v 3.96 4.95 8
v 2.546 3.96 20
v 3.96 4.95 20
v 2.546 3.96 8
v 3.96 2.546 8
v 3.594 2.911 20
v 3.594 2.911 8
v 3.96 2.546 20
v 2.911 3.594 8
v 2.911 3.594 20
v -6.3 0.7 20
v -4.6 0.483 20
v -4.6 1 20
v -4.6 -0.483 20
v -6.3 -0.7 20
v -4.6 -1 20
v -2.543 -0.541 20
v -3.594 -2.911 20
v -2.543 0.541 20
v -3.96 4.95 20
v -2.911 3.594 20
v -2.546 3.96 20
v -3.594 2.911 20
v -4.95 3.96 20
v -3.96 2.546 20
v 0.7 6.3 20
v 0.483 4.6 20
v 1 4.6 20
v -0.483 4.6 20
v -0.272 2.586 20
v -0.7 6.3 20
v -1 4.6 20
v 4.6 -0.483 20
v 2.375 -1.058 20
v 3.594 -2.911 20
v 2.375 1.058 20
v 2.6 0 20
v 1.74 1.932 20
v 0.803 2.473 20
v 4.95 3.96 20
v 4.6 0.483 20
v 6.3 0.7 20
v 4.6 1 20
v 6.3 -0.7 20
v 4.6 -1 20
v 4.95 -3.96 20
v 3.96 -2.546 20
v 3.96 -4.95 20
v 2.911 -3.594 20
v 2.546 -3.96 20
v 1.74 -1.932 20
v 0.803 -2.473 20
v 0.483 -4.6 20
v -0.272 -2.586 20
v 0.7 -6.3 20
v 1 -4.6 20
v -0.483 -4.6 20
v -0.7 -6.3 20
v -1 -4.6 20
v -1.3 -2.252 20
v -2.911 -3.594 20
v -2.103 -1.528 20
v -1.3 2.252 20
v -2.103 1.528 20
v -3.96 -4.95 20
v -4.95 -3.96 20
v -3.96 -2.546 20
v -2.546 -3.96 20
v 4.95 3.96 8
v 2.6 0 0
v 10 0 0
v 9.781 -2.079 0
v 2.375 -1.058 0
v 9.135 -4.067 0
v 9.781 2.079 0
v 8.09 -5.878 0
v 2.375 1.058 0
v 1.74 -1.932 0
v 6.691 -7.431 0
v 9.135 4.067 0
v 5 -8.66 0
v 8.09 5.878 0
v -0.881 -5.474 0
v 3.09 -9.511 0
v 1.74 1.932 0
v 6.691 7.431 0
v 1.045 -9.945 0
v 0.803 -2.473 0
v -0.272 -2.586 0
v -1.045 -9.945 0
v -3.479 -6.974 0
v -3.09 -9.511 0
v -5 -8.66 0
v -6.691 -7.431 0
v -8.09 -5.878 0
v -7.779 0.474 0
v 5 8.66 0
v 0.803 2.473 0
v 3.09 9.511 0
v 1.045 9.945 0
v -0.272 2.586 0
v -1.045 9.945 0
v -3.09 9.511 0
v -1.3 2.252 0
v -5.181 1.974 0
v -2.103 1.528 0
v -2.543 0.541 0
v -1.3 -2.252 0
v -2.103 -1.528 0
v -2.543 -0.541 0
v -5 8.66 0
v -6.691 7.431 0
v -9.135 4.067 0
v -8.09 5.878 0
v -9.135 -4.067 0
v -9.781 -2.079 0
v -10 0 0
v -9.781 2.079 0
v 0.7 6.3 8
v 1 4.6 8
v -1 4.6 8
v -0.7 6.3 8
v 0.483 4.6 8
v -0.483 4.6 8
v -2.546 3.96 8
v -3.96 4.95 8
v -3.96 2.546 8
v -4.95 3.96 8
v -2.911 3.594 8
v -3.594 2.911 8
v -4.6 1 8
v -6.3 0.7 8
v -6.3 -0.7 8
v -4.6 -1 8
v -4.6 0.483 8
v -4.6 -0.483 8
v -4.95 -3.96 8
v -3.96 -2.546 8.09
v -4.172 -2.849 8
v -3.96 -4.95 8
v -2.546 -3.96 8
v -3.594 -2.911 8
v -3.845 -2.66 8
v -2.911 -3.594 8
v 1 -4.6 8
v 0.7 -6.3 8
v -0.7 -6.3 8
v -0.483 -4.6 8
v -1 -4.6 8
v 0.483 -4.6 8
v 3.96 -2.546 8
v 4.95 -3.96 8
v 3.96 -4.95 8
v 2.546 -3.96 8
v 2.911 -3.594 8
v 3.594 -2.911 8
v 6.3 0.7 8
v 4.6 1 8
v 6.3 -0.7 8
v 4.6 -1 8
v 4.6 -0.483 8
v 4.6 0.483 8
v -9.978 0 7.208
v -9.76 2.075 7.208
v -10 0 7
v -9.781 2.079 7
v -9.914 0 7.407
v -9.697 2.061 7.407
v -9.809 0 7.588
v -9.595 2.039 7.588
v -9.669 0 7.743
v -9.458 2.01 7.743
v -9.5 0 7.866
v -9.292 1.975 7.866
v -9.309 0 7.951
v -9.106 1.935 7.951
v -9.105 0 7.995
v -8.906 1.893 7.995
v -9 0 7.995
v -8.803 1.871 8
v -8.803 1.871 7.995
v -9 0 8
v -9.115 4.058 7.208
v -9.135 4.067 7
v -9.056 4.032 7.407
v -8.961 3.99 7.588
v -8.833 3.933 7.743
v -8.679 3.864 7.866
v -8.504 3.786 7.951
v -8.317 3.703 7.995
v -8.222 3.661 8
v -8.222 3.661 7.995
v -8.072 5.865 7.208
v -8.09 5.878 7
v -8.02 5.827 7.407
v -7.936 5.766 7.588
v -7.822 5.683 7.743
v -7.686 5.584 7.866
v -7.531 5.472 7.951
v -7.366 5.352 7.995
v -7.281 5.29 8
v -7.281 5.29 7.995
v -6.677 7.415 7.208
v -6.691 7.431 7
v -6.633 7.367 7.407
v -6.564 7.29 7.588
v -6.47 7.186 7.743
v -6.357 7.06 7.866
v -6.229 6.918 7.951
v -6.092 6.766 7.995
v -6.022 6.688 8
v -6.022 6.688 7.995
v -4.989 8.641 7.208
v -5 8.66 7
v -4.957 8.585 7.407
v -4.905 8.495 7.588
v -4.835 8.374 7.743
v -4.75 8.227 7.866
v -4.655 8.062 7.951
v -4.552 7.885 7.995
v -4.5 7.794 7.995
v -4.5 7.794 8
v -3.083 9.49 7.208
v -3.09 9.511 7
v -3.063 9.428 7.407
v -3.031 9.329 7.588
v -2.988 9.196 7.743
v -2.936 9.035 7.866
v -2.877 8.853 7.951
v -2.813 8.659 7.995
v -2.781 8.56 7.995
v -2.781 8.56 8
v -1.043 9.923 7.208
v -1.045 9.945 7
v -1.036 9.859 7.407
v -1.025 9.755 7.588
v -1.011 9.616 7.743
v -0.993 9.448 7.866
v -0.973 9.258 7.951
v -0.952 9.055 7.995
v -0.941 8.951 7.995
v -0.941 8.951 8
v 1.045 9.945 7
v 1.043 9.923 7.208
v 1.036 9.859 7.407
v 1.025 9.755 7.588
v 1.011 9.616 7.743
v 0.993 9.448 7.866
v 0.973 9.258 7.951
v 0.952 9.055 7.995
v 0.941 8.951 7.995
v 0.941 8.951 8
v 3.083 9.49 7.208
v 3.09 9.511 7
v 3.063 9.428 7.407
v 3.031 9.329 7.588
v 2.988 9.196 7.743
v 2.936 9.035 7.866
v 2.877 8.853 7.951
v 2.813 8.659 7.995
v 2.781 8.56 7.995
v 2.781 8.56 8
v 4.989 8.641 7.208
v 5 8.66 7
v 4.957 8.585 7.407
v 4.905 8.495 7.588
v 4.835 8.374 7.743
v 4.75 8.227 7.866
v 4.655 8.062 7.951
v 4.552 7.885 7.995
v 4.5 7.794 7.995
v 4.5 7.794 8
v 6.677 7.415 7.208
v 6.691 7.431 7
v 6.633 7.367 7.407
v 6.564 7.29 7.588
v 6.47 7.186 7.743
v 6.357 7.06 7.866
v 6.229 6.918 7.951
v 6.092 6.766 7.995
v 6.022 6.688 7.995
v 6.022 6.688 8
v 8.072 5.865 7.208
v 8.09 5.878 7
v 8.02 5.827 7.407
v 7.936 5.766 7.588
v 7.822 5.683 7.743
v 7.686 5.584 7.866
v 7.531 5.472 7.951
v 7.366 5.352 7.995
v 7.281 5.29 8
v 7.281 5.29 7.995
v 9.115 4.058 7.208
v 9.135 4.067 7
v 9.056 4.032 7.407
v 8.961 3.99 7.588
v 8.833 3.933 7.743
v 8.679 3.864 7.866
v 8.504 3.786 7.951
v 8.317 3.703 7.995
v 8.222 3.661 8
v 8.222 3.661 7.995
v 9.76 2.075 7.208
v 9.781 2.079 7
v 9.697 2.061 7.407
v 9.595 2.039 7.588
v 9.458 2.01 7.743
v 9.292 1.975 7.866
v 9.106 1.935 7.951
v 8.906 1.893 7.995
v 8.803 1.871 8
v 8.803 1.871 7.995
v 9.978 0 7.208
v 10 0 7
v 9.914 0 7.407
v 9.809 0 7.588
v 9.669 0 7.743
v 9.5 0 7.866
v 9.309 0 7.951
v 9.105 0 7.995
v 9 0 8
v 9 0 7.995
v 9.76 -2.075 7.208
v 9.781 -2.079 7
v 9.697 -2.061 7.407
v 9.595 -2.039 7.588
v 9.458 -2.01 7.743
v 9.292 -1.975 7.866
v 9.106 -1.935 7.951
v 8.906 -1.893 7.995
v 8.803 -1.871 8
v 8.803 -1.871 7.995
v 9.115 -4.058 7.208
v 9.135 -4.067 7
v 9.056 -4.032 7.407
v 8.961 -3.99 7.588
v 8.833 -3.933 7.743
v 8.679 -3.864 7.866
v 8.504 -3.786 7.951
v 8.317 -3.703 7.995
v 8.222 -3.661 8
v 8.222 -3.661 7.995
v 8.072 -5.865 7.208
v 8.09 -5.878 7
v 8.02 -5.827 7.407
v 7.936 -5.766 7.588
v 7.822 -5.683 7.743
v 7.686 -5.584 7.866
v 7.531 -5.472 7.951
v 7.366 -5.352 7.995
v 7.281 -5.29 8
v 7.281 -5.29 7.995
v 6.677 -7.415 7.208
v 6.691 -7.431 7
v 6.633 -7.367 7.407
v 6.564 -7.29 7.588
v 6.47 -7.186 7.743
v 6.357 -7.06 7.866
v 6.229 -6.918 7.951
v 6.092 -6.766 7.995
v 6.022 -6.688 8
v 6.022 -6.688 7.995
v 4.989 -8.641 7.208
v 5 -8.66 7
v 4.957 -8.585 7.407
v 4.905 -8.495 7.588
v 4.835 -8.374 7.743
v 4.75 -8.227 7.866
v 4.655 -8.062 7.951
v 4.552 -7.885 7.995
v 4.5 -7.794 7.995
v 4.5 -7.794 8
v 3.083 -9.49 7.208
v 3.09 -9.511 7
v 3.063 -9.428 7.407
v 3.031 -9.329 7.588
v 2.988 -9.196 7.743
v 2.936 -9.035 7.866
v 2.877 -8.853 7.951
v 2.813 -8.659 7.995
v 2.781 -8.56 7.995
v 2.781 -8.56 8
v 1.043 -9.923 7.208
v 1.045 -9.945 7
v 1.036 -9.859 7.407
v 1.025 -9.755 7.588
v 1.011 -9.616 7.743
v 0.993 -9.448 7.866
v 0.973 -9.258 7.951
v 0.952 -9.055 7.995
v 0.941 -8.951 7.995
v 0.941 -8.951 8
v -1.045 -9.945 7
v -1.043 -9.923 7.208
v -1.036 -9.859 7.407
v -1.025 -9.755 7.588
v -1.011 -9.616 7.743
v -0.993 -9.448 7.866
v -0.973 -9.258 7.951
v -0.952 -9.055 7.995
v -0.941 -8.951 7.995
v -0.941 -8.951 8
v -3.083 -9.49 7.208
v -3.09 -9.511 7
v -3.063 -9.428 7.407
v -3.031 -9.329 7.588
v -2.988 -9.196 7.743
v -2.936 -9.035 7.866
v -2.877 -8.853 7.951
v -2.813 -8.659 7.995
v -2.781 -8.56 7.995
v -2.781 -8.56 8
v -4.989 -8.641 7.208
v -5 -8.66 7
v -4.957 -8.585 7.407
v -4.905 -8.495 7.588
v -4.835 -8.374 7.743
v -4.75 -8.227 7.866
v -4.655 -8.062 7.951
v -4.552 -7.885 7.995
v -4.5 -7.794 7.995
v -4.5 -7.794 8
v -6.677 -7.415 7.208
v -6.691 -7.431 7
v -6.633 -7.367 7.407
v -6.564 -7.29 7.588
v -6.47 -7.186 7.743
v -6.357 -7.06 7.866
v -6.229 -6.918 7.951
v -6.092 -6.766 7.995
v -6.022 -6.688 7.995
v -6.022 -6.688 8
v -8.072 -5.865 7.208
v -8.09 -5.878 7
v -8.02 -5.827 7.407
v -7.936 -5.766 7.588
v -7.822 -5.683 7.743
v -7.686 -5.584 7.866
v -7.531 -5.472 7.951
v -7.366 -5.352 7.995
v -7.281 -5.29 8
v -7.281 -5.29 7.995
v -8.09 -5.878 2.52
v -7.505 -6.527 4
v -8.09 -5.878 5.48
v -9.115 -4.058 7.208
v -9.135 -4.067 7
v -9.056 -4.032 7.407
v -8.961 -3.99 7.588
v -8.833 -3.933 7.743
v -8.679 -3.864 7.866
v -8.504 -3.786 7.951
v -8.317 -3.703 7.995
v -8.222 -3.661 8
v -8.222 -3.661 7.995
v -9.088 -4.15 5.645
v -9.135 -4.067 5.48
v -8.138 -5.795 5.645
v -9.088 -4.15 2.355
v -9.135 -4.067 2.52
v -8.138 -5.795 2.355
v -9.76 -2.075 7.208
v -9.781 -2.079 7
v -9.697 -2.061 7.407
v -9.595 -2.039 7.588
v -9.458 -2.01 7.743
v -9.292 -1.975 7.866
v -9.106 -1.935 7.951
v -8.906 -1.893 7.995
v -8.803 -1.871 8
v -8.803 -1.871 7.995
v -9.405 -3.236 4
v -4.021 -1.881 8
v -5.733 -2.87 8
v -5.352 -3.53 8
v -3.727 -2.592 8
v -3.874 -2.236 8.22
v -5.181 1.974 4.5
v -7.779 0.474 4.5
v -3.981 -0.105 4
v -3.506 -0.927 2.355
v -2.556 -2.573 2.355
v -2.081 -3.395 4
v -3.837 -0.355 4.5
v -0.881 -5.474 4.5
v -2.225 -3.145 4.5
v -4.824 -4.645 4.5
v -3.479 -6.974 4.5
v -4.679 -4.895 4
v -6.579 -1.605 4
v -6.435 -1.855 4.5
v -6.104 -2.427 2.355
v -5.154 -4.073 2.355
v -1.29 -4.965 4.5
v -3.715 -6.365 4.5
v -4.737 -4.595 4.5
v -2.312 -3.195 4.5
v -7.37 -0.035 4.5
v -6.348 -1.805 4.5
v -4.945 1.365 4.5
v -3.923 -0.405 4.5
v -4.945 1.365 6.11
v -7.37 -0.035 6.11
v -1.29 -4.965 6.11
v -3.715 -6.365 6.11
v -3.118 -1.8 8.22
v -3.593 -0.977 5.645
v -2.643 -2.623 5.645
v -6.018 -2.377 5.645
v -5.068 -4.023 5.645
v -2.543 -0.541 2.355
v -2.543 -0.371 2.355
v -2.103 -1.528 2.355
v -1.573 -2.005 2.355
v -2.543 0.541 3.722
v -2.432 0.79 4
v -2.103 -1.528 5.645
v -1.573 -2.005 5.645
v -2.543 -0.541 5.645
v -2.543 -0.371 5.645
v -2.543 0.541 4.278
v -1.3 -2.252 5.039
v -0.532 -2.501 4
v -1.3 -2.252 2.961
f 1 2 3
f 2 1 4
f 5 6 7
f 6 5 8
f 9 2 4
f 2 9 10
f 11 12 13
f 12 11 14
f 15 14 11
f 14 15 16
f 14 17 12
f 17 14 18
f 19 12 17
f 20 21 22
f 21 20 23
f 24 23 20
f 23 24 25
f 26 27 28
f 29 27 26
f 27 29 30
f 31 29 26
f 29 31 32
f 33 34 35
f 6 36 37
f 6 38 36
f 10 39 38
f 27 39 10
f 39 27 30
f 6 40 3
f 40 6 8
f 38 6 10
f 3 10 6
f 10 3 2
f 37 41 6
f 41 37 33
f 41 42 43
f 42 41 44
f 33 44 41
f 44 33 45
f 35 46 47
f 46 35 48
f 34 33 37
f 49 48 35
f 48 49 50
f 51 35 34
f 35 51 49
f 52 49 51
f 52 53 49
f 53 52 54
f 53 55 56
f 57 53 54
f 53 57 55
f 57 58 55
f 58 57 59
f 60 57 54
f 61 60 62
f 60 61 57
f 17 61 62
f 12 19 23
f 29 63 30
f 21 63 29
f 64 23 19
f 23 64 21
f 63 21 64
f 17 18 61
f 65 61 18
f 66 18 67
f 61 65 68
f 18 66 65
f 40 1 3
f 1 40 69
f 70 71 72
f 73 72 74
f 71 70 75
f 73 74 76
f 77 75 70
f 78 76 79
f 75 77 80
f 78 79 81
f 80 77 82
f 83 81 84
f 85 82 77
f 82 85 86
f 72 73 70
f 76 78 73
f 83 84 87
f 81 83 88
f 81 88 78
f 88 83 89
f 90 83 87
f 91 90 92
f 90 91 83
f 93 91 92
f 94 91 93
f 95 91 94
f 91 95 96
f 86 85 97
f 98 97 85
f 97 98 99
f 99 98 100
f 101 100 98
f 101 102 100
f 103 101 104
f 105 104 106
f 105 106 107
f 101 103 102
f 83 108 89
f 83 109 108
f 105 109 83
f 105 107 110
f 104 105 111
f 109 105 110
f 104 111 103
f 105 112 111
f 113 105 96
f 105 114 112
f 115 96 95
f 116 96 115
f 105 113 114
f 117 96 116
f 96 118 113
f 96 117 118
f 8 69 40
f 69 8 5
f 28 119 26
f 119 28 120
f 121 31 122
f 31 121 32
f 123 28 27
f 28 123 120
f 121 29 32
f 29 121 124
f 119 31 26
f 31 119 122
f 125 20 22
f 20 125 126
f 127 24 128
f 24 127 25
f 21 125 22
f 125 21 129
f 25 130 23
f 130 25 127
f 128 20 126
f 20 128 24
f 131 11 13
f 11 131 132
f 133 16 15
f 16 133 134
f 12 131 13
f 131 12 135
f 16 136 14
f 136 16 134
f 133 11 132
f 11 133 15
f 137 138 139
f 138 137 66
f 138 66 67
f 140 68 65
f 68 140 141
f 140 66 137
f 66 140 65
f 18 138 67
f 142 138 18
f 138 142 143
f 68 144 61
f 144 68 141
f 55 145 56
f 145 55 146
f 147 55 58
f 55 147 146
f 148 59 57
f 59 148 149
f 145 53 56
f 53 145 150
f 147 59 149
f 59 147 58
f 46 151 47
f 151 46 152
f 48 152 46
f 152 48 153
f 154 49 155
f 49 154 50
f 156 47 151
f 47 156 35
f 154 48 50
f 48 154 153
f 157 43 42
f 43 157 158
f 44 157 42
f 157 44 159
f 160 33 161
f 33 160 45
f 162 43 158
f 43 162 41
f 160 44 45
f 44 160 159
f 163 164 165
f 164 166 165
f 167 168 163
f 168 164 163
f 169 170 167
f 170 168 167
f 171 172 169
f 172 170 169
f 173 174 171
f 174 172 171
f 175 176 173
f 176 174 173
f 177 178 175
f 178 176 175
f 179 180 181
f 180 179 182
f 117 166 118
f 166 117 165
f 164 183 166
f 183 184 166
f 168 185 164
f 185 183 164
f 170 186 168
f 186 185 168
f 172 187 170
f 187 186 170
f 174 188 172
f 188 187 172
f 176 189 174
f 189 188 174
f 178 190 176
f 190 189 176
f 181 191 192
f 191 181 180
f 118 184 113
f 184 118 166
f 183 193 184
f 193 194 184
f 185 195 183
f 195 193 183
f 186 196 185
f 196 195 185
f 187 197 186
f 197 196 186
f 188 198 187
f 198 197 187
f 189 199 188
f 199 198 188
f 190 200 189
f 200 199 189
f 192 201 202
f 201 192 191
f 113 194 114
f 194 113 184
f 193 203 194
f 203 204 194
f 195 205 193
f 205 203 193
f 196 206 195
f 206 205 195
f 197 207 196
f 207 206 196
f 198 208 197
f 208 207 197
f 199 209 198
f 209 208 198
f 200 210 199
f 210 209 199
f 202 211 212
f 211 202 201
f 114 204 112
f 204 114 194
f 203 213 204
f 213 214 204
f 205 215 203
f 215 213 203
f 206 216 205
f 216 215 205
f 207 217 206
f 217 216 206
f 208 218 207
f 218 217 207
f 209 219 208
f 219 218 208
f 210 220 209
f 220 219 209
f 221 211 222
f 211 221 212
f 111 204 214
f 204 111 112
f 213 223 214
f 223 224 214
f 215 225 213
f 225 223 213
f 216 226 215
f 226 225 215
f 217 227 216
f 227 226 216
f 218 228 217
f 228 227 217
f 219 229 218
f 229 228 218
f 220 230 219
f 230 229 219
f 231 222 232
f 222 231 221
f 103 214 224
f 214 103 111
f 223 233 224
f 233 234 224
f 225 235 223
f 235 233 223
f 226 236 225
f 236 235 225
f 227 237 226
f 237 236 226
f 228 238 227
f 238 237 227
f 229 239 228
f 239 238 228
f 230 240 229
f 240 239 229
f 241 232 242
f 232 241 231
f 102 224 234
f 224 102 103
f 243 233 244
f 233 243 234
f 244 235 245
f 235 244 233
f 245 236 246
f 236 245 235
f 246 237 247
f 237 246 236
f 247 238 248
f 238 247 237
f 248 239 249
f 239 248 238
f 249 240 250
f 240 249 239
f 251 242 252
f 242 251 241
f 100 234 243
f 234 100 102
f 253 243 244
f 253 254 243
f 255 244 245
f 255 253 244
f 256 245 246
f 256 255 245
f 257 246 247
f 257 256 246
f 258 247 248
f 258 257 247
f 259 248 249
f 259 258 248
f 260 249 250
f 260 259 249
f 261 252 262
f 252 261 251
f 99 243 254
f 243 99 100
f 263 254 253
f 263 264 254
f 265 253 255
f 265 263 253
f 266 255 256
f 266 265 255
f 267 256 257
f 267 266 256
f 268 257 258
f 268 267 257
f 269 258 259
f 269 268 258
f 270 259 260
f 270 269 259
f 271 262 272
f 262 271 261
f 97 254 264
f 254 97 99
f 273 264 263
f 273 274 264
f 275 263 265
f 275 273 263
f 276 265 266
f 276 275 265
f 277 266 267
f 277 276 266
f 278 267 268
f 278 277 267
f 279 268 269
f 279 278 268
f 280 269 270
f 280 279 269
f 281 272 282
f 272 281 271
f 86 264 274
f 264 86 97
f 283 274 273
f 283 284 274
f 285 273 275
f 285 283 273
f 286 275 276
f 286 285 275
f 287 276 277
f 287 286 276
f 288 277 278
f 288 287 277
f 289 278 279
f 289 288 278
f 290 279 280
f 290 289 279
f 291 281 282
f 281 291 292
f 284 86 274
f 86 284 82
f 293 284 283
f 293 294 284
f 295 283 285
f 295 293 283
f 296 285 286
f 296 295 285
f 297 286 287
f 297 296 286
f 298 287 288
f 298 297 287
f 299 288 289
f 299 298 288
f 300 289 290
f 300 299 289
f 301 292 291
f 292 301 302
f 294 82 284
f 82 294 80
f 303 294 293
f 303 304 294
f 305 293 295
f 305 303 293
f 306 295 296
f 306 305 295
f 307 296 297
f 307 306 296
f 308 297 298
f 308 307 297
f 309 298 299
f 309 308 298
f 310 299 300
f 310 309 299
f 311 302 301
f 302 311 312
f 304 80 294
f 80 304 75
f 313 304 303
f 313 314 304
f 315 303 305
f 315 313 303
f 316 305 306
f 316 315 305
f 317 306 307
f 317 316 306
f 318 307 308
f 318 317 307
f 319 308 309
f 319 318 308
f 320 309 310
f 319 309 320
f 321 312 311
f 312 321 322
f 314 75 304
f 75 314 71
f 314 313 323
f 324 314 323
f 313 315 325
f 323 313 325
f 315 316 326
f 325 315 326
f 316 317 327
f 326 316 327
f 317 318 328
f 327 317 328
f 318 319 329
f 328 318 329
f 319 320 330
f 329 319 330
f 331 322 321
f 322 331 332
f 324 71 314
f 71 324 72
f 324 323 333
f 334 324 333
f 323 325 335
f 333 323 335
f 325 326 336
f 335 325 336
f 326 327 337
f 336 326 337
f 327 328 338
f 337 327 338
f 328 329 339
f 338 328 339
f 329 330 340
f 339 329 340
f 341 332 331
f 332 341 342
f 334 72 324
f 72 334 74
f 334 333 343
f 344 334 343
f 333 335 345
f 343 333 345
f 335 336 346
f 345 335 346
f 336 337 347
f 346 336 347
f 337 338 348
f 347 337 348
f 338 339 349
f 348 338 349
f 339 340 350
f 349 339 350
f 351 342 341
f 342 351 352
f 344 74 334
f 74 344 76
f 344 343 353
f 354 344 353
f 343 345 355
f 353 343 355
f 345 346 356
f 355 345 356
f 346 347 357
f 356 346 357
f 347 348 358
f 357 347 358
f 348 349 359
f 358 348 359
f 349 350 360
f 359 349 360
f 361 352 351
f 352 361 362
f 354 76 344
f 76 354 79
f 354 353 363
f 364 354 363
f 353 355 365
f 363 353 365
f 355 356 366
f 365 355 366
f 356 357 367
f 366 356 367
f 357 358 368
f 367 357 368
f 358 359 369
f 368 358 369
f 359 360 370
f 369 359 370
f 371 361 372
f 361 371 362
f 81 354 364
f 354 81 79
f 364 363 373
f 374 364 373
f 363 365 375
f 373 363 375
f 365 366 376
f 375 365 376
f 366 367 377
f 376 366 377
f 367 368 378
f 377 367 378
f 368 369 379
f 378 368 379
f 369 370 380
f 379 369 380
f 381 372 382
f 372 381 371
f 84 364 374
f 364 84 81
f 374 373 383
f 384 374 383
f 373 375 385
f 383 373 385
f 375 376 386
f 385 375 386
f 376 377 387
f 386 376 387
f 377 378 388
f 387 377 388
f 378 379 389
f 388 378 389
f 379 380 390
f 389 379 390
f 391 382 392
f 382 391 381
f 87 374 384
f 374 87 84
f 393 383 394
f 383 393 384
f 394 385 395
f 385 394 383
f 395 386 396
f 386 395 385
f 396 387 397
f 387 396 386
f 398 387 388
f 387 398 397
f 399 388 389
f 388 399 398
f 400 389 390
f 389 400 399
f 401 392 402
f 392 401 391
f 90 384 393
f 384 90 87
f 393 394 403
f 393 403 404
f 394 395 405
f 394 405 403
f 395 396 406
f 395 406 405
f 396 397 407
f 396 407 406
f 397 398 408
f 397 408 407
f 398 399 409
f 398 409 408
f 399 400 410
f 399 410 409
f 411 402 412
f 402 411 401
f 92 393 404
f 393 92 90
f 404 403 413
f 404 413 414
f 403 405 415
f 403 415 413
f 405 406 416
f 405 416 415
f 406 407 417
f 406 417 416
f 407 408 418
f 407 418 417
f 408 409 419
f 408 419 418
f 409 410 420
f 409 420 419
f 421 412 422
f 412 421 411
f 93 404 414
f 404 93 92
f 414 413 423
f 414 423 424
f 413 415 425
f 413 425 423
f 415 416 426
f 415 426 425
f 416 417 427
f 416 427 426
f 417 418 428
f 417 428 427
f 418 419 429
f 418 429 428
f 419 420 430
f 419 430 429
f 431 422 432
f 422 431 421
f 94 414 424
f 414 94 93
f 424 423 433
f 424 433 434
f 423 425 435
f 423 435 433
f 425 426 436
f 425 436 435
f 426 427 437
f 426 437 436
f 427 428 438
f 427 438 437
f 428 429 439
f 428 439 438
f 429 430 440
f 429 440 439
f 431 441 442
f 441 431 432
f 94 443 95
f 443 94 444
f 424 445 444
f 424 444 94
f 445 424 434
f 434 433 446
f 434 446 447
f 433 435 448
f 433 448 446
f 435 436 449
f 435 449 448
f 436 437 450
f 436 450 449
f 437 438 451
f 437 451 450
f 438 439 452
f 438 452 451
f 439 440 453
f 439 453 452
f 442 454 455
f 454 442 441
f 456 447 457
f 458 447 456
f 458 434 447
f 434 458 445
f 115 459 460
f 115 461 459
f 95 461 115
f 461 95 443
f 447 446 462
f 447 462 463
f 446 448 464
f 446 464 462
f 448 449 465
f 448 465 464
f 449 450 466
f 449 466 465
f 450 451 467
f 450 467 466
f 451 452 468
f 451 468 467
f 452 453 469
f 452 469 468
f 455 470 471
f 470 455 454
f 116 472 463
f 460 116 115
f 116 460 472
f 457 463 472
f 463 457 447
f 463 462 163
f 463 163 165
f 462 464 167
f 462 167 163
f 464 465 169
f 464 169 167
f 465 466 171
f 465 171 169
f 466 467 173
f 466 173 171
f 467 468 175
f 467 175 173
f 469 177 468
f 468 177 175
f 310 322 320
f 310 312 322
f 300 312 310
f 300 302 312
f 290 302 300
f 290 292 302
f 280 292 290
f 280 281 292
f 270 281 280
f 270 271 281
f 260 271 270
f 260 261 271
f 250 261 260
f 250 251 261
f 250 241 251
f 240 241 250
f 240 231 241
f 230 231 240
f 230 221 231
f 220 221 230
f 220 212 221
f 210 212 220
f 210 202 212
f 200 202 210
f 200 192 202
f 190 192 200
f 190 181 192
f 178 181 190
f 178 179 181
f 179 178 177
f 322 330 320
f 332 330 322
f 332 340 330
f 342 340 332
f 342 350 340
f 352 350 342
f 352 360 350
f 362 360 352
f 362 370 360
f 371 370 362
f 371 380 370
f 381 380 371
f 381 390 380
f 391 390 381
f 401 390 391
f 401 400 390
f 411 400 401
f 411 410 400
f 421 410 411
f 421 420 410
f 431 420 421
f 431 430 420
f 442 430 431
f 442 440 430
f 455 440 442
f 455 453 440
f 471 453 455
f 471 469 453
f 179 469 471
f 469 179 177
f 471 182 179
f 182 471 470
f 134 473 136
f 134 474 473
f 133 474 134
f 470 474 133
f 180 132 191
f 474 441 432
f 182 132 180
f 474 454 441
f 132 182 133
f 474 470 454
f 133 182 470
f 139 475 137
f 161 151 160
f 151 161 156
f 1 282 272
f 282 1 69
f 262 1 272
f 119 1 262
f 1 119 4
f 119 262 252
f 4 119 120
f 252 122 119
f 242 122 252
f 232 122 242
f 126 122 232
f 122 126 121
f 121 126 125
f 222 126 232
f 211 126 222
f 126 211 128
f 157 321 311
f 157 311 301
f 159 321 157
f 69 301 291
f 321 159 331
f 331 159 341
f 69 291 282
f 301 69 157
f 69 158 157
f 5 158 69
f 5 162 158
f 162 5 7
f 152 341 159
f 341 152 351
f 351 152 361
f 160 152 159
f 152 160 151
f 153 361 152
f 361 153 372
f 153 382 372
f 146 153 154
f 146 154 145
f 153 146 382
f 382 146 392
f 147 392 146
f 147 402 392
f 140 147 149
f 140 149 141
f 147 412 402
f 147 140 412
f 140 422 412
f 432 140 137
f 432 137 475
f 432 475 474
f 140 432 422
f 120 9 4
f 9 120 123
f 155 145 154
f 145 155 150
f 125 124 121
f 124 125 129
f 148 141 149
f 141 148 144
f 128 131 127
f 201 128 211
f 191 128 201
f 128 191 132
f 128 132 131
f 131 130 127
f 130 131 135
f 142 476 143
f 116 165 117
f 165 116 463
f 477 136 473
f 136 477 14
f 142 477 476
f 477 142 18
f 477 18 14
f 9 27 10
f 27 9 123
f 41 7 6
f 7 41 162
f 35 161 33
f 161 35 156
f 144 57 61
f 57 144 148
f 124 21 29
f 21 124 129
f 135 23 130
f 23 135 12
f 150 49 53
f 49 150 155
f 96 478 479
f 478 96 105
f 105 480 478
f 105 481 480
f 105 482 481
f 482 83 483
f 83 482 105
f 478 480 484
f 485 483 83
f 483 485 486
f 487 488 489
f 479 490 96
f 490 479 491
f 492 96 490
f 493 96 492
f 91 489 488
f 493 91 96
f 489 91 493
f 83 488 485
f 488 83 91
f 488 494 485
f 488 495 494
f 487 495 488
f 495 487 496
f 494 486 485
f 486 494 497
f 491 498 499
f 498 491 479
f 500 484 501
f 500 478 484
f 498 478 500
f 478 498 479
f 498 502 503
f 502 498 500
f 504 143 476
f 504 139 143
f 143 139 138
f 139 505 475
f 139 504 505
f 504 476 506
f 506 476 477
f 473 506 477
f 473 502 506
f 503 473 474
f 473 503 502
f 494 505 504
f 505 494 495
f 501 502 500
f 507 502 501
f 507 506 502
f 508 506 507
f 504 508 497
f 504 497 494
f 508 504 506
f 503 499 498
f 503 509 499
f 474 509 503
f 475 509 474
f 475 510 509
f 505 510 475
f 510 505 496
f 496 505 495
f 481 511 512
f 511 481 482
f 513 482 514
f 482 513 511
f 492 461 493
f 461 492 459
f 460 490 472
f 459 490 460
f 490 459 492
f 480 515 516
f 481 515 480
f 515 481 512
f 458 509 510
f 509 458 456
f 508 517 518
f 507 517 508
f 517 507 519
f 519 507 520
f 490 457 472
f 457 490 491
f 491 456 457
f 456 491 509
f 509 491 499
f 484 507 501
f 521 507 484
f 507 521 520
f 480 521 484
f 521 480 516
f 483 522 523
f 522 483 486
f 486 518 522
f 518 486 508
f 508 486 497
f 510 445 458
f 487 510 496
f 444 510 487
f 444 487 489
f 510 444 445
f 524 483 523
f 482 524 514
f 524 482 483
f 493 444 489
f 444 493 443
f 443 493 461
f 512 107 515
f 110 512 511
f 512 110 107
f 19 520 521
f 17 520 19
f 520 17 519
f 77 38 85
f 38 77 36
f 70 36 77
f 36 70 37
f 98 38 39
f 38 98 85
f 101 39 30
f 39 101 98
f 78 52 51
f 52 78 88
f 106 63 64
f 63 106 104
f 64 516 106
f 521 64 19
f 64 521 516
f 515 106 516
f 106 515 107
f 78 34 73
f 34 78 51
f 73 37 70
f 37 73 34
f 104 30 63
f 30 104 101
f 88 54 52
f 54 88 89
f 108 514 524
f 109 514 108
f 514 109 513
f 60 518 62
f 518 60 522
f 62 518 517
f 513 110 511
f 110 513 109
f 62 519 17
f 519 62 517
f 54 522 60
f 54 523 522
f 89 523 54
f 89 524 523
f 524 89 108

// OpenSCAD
// file: configuration-metric.scad
// PRUSA Mendel  
// Metric Configuration file
// GNU GPL v2
// Josef Průša
// josefprusa@me.com
// prusadjs.cz
// http://www.reprap.org/wiki/Prusa_Mendel
// http://github.com/prusajr/PrusaMendel

// CONFIGURATION FILE FOR METRIC VARIANT OF PRUSA MENDEL

// M8 rod diameter
m8_diameter = 8.4;

// M8 nut diameter diameter
// Used for $fn nut trick -> cylinder(h = 5, r=m8_nut_diameter, $fn=6, center=true);
m8_nut_diameter = 16.4;

// M4 rod/screw diameter
m4_diameter = 5;

// M4 nut diameter
// Used for $fn nut trick -> cylinder(h = 5, r=m4_nut_diameter, $fn=6, center=true);
m4_nut_diameter = 9;

// M3 rod/screw diameter
m3_diameter = 4.4;

// M3 nut diameter diameter
// Used for $fn nut trick -> cylinder(h = 5, r=m3_nut_diameter, $fn=6, center=true);
m3_nut_diameter = 7;

// Bushing holders diameter
bushing_diameter = 11;

//Motor shaft diameter
motor_shaft=5;

//Bushings
	//Size of rod on which it will slide
	bushing_rodsize = 8;
	
	//Size of whole bushings (diameter because the core is cylinder)
	bushing_outerDiameter = 16;
	
	//How long they are going to be
	bushing_lenght = 11;
	
	// TYPE Can generate three versions
	// 1 - regular old ones
	// 2 - helical ones
	// 3 - holders for brass or any other bought bushings
	bushing_type = 2;
// file: configuration.scad
// PRUSA Mendel  
// Configuration file
// GNU GPL v2
// Josef Průša
// josefprusa@me.com
// prusadjs.cz
// http://www.reprap.org/wiki/Prusa_Mendel
// http://github.com/prusajr/PrusaMendel

// PLESE SELECT ONE OF THE CONFIGURATION FILES
// BY UN-COMMENTING IT

// METRIC VERSION
include <configuration-metric.scad>

// IMPERIAL VERSION (TODO, just place holder)
// Spacexula will do it ;-)
// include <configuration-imperial.scad>

// MINI-HUXLEY VERSION (TODO, just place holder)
// include <configuration-huxley.scad>

// MEGA VERSION (TODO, just place holder)
// include <configuration-mega.scad>
// main file
// Belt pulley is http://www.thingiverse.com/thing:3104 by GilesBathgate
// GPLV3

include <configuration.scad>


/**
 * @name Pulley
 * @category Printed
 * @using 1 m3nut
 * @using 1 m3x10
 */
module pulley()
{


	module spur()
	{
		linear_extrude(height=20) polygon([[-1,-1],[-1,1],[0.7,0.7],[0.7,-0.7]],[[0,1,2,3,0]]);
	}
	
 difference()
 {	 
 	union()
 	{
 		//base
 		rotate_extrude($fn=30)
 		{
 				square([9,8]);
 				square([10,7]);
 				translate([9,7]) circle(1);
 		}
    	
    	//shaft
    	cylinder(r=motor_shaft-0.2,h=20, $fn=8);
    	
    	//spurs
    	for(i=[1:8]) rotate([0,0,i*(360/8)])
    	translate([5.6,0,0])spur();
   }
   
   //shaft hole
    translate([0,0,-1])cylinder(r=motor_shaft/2+0.1,h=22,$fn=15);
    		
 //captive nut and grub holes
    for(j=[1:1]) rotate([0,0,j*(360/3)])
	translate([0,20,4])rotate([90,0,0])
	union()
	{
		//entrance
		translate([0,-3,15]) cube([8.6,7,3],center=true);
		//nut
		translate([0,0,13.6]) rotate([0,0,30])cylinder(r=4.22,h=2.8,$fn=6);
		//grub hole
		translate([0,0,9]) cylinder(r=1.9,h=10);
	}

 }

   
}

pulley();
